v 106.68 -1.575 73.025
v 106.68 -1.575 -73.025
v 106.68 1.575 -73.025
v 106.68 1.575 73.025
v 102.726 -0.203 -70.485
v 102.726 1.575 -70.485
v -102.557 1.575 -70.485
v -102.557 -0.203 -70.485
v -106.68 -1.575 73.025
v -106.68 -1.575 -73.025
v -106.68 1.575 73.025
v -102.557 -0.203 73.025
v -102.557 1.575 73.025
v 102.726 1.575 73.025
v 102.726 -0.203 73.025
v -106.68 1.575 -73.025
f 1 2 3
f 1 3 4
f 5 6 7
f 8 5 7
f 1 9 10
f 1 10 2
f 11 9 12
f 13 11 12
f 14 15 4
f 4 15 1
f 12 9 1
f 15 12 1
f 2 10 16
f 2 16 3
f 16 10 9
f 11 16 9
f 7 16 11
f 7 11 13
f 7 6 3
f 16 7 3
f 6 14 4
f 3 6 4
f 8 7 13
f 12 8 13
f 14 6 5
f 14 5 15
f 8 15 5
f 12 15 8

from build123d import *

# Parameters (mm, degrees)
F0_W     = 213.36
F0_H     = 146.05
F1_DEPTH = 1.5748
F2_W     = 205.2828
F2_H     = 143.51
F3_DEPTH = 1.778


with BuildPart() as f1:
    # F0 (on Front) → F1 (new body, symmetric)
    with BuildSketch(Plane.XZ):
        Rectangle(F0_W, F0_H)
    extrude(amount=F1_DEPTH, both=True)

    # F2 (on face) → F3 (cut)
    with BuildSketch(Plane(origin=(0, 1.5748, 0), x_dir=(-1, 0, 0), z_dir=(0, 1, 0))):
        with Locations((-0.084434, 1.27)):
            Rectangle(F2_W, F2_H)
    extrude(amount=-F3_DEPTH, mode=Mode.SUBTRACT)


solid = f1.part
